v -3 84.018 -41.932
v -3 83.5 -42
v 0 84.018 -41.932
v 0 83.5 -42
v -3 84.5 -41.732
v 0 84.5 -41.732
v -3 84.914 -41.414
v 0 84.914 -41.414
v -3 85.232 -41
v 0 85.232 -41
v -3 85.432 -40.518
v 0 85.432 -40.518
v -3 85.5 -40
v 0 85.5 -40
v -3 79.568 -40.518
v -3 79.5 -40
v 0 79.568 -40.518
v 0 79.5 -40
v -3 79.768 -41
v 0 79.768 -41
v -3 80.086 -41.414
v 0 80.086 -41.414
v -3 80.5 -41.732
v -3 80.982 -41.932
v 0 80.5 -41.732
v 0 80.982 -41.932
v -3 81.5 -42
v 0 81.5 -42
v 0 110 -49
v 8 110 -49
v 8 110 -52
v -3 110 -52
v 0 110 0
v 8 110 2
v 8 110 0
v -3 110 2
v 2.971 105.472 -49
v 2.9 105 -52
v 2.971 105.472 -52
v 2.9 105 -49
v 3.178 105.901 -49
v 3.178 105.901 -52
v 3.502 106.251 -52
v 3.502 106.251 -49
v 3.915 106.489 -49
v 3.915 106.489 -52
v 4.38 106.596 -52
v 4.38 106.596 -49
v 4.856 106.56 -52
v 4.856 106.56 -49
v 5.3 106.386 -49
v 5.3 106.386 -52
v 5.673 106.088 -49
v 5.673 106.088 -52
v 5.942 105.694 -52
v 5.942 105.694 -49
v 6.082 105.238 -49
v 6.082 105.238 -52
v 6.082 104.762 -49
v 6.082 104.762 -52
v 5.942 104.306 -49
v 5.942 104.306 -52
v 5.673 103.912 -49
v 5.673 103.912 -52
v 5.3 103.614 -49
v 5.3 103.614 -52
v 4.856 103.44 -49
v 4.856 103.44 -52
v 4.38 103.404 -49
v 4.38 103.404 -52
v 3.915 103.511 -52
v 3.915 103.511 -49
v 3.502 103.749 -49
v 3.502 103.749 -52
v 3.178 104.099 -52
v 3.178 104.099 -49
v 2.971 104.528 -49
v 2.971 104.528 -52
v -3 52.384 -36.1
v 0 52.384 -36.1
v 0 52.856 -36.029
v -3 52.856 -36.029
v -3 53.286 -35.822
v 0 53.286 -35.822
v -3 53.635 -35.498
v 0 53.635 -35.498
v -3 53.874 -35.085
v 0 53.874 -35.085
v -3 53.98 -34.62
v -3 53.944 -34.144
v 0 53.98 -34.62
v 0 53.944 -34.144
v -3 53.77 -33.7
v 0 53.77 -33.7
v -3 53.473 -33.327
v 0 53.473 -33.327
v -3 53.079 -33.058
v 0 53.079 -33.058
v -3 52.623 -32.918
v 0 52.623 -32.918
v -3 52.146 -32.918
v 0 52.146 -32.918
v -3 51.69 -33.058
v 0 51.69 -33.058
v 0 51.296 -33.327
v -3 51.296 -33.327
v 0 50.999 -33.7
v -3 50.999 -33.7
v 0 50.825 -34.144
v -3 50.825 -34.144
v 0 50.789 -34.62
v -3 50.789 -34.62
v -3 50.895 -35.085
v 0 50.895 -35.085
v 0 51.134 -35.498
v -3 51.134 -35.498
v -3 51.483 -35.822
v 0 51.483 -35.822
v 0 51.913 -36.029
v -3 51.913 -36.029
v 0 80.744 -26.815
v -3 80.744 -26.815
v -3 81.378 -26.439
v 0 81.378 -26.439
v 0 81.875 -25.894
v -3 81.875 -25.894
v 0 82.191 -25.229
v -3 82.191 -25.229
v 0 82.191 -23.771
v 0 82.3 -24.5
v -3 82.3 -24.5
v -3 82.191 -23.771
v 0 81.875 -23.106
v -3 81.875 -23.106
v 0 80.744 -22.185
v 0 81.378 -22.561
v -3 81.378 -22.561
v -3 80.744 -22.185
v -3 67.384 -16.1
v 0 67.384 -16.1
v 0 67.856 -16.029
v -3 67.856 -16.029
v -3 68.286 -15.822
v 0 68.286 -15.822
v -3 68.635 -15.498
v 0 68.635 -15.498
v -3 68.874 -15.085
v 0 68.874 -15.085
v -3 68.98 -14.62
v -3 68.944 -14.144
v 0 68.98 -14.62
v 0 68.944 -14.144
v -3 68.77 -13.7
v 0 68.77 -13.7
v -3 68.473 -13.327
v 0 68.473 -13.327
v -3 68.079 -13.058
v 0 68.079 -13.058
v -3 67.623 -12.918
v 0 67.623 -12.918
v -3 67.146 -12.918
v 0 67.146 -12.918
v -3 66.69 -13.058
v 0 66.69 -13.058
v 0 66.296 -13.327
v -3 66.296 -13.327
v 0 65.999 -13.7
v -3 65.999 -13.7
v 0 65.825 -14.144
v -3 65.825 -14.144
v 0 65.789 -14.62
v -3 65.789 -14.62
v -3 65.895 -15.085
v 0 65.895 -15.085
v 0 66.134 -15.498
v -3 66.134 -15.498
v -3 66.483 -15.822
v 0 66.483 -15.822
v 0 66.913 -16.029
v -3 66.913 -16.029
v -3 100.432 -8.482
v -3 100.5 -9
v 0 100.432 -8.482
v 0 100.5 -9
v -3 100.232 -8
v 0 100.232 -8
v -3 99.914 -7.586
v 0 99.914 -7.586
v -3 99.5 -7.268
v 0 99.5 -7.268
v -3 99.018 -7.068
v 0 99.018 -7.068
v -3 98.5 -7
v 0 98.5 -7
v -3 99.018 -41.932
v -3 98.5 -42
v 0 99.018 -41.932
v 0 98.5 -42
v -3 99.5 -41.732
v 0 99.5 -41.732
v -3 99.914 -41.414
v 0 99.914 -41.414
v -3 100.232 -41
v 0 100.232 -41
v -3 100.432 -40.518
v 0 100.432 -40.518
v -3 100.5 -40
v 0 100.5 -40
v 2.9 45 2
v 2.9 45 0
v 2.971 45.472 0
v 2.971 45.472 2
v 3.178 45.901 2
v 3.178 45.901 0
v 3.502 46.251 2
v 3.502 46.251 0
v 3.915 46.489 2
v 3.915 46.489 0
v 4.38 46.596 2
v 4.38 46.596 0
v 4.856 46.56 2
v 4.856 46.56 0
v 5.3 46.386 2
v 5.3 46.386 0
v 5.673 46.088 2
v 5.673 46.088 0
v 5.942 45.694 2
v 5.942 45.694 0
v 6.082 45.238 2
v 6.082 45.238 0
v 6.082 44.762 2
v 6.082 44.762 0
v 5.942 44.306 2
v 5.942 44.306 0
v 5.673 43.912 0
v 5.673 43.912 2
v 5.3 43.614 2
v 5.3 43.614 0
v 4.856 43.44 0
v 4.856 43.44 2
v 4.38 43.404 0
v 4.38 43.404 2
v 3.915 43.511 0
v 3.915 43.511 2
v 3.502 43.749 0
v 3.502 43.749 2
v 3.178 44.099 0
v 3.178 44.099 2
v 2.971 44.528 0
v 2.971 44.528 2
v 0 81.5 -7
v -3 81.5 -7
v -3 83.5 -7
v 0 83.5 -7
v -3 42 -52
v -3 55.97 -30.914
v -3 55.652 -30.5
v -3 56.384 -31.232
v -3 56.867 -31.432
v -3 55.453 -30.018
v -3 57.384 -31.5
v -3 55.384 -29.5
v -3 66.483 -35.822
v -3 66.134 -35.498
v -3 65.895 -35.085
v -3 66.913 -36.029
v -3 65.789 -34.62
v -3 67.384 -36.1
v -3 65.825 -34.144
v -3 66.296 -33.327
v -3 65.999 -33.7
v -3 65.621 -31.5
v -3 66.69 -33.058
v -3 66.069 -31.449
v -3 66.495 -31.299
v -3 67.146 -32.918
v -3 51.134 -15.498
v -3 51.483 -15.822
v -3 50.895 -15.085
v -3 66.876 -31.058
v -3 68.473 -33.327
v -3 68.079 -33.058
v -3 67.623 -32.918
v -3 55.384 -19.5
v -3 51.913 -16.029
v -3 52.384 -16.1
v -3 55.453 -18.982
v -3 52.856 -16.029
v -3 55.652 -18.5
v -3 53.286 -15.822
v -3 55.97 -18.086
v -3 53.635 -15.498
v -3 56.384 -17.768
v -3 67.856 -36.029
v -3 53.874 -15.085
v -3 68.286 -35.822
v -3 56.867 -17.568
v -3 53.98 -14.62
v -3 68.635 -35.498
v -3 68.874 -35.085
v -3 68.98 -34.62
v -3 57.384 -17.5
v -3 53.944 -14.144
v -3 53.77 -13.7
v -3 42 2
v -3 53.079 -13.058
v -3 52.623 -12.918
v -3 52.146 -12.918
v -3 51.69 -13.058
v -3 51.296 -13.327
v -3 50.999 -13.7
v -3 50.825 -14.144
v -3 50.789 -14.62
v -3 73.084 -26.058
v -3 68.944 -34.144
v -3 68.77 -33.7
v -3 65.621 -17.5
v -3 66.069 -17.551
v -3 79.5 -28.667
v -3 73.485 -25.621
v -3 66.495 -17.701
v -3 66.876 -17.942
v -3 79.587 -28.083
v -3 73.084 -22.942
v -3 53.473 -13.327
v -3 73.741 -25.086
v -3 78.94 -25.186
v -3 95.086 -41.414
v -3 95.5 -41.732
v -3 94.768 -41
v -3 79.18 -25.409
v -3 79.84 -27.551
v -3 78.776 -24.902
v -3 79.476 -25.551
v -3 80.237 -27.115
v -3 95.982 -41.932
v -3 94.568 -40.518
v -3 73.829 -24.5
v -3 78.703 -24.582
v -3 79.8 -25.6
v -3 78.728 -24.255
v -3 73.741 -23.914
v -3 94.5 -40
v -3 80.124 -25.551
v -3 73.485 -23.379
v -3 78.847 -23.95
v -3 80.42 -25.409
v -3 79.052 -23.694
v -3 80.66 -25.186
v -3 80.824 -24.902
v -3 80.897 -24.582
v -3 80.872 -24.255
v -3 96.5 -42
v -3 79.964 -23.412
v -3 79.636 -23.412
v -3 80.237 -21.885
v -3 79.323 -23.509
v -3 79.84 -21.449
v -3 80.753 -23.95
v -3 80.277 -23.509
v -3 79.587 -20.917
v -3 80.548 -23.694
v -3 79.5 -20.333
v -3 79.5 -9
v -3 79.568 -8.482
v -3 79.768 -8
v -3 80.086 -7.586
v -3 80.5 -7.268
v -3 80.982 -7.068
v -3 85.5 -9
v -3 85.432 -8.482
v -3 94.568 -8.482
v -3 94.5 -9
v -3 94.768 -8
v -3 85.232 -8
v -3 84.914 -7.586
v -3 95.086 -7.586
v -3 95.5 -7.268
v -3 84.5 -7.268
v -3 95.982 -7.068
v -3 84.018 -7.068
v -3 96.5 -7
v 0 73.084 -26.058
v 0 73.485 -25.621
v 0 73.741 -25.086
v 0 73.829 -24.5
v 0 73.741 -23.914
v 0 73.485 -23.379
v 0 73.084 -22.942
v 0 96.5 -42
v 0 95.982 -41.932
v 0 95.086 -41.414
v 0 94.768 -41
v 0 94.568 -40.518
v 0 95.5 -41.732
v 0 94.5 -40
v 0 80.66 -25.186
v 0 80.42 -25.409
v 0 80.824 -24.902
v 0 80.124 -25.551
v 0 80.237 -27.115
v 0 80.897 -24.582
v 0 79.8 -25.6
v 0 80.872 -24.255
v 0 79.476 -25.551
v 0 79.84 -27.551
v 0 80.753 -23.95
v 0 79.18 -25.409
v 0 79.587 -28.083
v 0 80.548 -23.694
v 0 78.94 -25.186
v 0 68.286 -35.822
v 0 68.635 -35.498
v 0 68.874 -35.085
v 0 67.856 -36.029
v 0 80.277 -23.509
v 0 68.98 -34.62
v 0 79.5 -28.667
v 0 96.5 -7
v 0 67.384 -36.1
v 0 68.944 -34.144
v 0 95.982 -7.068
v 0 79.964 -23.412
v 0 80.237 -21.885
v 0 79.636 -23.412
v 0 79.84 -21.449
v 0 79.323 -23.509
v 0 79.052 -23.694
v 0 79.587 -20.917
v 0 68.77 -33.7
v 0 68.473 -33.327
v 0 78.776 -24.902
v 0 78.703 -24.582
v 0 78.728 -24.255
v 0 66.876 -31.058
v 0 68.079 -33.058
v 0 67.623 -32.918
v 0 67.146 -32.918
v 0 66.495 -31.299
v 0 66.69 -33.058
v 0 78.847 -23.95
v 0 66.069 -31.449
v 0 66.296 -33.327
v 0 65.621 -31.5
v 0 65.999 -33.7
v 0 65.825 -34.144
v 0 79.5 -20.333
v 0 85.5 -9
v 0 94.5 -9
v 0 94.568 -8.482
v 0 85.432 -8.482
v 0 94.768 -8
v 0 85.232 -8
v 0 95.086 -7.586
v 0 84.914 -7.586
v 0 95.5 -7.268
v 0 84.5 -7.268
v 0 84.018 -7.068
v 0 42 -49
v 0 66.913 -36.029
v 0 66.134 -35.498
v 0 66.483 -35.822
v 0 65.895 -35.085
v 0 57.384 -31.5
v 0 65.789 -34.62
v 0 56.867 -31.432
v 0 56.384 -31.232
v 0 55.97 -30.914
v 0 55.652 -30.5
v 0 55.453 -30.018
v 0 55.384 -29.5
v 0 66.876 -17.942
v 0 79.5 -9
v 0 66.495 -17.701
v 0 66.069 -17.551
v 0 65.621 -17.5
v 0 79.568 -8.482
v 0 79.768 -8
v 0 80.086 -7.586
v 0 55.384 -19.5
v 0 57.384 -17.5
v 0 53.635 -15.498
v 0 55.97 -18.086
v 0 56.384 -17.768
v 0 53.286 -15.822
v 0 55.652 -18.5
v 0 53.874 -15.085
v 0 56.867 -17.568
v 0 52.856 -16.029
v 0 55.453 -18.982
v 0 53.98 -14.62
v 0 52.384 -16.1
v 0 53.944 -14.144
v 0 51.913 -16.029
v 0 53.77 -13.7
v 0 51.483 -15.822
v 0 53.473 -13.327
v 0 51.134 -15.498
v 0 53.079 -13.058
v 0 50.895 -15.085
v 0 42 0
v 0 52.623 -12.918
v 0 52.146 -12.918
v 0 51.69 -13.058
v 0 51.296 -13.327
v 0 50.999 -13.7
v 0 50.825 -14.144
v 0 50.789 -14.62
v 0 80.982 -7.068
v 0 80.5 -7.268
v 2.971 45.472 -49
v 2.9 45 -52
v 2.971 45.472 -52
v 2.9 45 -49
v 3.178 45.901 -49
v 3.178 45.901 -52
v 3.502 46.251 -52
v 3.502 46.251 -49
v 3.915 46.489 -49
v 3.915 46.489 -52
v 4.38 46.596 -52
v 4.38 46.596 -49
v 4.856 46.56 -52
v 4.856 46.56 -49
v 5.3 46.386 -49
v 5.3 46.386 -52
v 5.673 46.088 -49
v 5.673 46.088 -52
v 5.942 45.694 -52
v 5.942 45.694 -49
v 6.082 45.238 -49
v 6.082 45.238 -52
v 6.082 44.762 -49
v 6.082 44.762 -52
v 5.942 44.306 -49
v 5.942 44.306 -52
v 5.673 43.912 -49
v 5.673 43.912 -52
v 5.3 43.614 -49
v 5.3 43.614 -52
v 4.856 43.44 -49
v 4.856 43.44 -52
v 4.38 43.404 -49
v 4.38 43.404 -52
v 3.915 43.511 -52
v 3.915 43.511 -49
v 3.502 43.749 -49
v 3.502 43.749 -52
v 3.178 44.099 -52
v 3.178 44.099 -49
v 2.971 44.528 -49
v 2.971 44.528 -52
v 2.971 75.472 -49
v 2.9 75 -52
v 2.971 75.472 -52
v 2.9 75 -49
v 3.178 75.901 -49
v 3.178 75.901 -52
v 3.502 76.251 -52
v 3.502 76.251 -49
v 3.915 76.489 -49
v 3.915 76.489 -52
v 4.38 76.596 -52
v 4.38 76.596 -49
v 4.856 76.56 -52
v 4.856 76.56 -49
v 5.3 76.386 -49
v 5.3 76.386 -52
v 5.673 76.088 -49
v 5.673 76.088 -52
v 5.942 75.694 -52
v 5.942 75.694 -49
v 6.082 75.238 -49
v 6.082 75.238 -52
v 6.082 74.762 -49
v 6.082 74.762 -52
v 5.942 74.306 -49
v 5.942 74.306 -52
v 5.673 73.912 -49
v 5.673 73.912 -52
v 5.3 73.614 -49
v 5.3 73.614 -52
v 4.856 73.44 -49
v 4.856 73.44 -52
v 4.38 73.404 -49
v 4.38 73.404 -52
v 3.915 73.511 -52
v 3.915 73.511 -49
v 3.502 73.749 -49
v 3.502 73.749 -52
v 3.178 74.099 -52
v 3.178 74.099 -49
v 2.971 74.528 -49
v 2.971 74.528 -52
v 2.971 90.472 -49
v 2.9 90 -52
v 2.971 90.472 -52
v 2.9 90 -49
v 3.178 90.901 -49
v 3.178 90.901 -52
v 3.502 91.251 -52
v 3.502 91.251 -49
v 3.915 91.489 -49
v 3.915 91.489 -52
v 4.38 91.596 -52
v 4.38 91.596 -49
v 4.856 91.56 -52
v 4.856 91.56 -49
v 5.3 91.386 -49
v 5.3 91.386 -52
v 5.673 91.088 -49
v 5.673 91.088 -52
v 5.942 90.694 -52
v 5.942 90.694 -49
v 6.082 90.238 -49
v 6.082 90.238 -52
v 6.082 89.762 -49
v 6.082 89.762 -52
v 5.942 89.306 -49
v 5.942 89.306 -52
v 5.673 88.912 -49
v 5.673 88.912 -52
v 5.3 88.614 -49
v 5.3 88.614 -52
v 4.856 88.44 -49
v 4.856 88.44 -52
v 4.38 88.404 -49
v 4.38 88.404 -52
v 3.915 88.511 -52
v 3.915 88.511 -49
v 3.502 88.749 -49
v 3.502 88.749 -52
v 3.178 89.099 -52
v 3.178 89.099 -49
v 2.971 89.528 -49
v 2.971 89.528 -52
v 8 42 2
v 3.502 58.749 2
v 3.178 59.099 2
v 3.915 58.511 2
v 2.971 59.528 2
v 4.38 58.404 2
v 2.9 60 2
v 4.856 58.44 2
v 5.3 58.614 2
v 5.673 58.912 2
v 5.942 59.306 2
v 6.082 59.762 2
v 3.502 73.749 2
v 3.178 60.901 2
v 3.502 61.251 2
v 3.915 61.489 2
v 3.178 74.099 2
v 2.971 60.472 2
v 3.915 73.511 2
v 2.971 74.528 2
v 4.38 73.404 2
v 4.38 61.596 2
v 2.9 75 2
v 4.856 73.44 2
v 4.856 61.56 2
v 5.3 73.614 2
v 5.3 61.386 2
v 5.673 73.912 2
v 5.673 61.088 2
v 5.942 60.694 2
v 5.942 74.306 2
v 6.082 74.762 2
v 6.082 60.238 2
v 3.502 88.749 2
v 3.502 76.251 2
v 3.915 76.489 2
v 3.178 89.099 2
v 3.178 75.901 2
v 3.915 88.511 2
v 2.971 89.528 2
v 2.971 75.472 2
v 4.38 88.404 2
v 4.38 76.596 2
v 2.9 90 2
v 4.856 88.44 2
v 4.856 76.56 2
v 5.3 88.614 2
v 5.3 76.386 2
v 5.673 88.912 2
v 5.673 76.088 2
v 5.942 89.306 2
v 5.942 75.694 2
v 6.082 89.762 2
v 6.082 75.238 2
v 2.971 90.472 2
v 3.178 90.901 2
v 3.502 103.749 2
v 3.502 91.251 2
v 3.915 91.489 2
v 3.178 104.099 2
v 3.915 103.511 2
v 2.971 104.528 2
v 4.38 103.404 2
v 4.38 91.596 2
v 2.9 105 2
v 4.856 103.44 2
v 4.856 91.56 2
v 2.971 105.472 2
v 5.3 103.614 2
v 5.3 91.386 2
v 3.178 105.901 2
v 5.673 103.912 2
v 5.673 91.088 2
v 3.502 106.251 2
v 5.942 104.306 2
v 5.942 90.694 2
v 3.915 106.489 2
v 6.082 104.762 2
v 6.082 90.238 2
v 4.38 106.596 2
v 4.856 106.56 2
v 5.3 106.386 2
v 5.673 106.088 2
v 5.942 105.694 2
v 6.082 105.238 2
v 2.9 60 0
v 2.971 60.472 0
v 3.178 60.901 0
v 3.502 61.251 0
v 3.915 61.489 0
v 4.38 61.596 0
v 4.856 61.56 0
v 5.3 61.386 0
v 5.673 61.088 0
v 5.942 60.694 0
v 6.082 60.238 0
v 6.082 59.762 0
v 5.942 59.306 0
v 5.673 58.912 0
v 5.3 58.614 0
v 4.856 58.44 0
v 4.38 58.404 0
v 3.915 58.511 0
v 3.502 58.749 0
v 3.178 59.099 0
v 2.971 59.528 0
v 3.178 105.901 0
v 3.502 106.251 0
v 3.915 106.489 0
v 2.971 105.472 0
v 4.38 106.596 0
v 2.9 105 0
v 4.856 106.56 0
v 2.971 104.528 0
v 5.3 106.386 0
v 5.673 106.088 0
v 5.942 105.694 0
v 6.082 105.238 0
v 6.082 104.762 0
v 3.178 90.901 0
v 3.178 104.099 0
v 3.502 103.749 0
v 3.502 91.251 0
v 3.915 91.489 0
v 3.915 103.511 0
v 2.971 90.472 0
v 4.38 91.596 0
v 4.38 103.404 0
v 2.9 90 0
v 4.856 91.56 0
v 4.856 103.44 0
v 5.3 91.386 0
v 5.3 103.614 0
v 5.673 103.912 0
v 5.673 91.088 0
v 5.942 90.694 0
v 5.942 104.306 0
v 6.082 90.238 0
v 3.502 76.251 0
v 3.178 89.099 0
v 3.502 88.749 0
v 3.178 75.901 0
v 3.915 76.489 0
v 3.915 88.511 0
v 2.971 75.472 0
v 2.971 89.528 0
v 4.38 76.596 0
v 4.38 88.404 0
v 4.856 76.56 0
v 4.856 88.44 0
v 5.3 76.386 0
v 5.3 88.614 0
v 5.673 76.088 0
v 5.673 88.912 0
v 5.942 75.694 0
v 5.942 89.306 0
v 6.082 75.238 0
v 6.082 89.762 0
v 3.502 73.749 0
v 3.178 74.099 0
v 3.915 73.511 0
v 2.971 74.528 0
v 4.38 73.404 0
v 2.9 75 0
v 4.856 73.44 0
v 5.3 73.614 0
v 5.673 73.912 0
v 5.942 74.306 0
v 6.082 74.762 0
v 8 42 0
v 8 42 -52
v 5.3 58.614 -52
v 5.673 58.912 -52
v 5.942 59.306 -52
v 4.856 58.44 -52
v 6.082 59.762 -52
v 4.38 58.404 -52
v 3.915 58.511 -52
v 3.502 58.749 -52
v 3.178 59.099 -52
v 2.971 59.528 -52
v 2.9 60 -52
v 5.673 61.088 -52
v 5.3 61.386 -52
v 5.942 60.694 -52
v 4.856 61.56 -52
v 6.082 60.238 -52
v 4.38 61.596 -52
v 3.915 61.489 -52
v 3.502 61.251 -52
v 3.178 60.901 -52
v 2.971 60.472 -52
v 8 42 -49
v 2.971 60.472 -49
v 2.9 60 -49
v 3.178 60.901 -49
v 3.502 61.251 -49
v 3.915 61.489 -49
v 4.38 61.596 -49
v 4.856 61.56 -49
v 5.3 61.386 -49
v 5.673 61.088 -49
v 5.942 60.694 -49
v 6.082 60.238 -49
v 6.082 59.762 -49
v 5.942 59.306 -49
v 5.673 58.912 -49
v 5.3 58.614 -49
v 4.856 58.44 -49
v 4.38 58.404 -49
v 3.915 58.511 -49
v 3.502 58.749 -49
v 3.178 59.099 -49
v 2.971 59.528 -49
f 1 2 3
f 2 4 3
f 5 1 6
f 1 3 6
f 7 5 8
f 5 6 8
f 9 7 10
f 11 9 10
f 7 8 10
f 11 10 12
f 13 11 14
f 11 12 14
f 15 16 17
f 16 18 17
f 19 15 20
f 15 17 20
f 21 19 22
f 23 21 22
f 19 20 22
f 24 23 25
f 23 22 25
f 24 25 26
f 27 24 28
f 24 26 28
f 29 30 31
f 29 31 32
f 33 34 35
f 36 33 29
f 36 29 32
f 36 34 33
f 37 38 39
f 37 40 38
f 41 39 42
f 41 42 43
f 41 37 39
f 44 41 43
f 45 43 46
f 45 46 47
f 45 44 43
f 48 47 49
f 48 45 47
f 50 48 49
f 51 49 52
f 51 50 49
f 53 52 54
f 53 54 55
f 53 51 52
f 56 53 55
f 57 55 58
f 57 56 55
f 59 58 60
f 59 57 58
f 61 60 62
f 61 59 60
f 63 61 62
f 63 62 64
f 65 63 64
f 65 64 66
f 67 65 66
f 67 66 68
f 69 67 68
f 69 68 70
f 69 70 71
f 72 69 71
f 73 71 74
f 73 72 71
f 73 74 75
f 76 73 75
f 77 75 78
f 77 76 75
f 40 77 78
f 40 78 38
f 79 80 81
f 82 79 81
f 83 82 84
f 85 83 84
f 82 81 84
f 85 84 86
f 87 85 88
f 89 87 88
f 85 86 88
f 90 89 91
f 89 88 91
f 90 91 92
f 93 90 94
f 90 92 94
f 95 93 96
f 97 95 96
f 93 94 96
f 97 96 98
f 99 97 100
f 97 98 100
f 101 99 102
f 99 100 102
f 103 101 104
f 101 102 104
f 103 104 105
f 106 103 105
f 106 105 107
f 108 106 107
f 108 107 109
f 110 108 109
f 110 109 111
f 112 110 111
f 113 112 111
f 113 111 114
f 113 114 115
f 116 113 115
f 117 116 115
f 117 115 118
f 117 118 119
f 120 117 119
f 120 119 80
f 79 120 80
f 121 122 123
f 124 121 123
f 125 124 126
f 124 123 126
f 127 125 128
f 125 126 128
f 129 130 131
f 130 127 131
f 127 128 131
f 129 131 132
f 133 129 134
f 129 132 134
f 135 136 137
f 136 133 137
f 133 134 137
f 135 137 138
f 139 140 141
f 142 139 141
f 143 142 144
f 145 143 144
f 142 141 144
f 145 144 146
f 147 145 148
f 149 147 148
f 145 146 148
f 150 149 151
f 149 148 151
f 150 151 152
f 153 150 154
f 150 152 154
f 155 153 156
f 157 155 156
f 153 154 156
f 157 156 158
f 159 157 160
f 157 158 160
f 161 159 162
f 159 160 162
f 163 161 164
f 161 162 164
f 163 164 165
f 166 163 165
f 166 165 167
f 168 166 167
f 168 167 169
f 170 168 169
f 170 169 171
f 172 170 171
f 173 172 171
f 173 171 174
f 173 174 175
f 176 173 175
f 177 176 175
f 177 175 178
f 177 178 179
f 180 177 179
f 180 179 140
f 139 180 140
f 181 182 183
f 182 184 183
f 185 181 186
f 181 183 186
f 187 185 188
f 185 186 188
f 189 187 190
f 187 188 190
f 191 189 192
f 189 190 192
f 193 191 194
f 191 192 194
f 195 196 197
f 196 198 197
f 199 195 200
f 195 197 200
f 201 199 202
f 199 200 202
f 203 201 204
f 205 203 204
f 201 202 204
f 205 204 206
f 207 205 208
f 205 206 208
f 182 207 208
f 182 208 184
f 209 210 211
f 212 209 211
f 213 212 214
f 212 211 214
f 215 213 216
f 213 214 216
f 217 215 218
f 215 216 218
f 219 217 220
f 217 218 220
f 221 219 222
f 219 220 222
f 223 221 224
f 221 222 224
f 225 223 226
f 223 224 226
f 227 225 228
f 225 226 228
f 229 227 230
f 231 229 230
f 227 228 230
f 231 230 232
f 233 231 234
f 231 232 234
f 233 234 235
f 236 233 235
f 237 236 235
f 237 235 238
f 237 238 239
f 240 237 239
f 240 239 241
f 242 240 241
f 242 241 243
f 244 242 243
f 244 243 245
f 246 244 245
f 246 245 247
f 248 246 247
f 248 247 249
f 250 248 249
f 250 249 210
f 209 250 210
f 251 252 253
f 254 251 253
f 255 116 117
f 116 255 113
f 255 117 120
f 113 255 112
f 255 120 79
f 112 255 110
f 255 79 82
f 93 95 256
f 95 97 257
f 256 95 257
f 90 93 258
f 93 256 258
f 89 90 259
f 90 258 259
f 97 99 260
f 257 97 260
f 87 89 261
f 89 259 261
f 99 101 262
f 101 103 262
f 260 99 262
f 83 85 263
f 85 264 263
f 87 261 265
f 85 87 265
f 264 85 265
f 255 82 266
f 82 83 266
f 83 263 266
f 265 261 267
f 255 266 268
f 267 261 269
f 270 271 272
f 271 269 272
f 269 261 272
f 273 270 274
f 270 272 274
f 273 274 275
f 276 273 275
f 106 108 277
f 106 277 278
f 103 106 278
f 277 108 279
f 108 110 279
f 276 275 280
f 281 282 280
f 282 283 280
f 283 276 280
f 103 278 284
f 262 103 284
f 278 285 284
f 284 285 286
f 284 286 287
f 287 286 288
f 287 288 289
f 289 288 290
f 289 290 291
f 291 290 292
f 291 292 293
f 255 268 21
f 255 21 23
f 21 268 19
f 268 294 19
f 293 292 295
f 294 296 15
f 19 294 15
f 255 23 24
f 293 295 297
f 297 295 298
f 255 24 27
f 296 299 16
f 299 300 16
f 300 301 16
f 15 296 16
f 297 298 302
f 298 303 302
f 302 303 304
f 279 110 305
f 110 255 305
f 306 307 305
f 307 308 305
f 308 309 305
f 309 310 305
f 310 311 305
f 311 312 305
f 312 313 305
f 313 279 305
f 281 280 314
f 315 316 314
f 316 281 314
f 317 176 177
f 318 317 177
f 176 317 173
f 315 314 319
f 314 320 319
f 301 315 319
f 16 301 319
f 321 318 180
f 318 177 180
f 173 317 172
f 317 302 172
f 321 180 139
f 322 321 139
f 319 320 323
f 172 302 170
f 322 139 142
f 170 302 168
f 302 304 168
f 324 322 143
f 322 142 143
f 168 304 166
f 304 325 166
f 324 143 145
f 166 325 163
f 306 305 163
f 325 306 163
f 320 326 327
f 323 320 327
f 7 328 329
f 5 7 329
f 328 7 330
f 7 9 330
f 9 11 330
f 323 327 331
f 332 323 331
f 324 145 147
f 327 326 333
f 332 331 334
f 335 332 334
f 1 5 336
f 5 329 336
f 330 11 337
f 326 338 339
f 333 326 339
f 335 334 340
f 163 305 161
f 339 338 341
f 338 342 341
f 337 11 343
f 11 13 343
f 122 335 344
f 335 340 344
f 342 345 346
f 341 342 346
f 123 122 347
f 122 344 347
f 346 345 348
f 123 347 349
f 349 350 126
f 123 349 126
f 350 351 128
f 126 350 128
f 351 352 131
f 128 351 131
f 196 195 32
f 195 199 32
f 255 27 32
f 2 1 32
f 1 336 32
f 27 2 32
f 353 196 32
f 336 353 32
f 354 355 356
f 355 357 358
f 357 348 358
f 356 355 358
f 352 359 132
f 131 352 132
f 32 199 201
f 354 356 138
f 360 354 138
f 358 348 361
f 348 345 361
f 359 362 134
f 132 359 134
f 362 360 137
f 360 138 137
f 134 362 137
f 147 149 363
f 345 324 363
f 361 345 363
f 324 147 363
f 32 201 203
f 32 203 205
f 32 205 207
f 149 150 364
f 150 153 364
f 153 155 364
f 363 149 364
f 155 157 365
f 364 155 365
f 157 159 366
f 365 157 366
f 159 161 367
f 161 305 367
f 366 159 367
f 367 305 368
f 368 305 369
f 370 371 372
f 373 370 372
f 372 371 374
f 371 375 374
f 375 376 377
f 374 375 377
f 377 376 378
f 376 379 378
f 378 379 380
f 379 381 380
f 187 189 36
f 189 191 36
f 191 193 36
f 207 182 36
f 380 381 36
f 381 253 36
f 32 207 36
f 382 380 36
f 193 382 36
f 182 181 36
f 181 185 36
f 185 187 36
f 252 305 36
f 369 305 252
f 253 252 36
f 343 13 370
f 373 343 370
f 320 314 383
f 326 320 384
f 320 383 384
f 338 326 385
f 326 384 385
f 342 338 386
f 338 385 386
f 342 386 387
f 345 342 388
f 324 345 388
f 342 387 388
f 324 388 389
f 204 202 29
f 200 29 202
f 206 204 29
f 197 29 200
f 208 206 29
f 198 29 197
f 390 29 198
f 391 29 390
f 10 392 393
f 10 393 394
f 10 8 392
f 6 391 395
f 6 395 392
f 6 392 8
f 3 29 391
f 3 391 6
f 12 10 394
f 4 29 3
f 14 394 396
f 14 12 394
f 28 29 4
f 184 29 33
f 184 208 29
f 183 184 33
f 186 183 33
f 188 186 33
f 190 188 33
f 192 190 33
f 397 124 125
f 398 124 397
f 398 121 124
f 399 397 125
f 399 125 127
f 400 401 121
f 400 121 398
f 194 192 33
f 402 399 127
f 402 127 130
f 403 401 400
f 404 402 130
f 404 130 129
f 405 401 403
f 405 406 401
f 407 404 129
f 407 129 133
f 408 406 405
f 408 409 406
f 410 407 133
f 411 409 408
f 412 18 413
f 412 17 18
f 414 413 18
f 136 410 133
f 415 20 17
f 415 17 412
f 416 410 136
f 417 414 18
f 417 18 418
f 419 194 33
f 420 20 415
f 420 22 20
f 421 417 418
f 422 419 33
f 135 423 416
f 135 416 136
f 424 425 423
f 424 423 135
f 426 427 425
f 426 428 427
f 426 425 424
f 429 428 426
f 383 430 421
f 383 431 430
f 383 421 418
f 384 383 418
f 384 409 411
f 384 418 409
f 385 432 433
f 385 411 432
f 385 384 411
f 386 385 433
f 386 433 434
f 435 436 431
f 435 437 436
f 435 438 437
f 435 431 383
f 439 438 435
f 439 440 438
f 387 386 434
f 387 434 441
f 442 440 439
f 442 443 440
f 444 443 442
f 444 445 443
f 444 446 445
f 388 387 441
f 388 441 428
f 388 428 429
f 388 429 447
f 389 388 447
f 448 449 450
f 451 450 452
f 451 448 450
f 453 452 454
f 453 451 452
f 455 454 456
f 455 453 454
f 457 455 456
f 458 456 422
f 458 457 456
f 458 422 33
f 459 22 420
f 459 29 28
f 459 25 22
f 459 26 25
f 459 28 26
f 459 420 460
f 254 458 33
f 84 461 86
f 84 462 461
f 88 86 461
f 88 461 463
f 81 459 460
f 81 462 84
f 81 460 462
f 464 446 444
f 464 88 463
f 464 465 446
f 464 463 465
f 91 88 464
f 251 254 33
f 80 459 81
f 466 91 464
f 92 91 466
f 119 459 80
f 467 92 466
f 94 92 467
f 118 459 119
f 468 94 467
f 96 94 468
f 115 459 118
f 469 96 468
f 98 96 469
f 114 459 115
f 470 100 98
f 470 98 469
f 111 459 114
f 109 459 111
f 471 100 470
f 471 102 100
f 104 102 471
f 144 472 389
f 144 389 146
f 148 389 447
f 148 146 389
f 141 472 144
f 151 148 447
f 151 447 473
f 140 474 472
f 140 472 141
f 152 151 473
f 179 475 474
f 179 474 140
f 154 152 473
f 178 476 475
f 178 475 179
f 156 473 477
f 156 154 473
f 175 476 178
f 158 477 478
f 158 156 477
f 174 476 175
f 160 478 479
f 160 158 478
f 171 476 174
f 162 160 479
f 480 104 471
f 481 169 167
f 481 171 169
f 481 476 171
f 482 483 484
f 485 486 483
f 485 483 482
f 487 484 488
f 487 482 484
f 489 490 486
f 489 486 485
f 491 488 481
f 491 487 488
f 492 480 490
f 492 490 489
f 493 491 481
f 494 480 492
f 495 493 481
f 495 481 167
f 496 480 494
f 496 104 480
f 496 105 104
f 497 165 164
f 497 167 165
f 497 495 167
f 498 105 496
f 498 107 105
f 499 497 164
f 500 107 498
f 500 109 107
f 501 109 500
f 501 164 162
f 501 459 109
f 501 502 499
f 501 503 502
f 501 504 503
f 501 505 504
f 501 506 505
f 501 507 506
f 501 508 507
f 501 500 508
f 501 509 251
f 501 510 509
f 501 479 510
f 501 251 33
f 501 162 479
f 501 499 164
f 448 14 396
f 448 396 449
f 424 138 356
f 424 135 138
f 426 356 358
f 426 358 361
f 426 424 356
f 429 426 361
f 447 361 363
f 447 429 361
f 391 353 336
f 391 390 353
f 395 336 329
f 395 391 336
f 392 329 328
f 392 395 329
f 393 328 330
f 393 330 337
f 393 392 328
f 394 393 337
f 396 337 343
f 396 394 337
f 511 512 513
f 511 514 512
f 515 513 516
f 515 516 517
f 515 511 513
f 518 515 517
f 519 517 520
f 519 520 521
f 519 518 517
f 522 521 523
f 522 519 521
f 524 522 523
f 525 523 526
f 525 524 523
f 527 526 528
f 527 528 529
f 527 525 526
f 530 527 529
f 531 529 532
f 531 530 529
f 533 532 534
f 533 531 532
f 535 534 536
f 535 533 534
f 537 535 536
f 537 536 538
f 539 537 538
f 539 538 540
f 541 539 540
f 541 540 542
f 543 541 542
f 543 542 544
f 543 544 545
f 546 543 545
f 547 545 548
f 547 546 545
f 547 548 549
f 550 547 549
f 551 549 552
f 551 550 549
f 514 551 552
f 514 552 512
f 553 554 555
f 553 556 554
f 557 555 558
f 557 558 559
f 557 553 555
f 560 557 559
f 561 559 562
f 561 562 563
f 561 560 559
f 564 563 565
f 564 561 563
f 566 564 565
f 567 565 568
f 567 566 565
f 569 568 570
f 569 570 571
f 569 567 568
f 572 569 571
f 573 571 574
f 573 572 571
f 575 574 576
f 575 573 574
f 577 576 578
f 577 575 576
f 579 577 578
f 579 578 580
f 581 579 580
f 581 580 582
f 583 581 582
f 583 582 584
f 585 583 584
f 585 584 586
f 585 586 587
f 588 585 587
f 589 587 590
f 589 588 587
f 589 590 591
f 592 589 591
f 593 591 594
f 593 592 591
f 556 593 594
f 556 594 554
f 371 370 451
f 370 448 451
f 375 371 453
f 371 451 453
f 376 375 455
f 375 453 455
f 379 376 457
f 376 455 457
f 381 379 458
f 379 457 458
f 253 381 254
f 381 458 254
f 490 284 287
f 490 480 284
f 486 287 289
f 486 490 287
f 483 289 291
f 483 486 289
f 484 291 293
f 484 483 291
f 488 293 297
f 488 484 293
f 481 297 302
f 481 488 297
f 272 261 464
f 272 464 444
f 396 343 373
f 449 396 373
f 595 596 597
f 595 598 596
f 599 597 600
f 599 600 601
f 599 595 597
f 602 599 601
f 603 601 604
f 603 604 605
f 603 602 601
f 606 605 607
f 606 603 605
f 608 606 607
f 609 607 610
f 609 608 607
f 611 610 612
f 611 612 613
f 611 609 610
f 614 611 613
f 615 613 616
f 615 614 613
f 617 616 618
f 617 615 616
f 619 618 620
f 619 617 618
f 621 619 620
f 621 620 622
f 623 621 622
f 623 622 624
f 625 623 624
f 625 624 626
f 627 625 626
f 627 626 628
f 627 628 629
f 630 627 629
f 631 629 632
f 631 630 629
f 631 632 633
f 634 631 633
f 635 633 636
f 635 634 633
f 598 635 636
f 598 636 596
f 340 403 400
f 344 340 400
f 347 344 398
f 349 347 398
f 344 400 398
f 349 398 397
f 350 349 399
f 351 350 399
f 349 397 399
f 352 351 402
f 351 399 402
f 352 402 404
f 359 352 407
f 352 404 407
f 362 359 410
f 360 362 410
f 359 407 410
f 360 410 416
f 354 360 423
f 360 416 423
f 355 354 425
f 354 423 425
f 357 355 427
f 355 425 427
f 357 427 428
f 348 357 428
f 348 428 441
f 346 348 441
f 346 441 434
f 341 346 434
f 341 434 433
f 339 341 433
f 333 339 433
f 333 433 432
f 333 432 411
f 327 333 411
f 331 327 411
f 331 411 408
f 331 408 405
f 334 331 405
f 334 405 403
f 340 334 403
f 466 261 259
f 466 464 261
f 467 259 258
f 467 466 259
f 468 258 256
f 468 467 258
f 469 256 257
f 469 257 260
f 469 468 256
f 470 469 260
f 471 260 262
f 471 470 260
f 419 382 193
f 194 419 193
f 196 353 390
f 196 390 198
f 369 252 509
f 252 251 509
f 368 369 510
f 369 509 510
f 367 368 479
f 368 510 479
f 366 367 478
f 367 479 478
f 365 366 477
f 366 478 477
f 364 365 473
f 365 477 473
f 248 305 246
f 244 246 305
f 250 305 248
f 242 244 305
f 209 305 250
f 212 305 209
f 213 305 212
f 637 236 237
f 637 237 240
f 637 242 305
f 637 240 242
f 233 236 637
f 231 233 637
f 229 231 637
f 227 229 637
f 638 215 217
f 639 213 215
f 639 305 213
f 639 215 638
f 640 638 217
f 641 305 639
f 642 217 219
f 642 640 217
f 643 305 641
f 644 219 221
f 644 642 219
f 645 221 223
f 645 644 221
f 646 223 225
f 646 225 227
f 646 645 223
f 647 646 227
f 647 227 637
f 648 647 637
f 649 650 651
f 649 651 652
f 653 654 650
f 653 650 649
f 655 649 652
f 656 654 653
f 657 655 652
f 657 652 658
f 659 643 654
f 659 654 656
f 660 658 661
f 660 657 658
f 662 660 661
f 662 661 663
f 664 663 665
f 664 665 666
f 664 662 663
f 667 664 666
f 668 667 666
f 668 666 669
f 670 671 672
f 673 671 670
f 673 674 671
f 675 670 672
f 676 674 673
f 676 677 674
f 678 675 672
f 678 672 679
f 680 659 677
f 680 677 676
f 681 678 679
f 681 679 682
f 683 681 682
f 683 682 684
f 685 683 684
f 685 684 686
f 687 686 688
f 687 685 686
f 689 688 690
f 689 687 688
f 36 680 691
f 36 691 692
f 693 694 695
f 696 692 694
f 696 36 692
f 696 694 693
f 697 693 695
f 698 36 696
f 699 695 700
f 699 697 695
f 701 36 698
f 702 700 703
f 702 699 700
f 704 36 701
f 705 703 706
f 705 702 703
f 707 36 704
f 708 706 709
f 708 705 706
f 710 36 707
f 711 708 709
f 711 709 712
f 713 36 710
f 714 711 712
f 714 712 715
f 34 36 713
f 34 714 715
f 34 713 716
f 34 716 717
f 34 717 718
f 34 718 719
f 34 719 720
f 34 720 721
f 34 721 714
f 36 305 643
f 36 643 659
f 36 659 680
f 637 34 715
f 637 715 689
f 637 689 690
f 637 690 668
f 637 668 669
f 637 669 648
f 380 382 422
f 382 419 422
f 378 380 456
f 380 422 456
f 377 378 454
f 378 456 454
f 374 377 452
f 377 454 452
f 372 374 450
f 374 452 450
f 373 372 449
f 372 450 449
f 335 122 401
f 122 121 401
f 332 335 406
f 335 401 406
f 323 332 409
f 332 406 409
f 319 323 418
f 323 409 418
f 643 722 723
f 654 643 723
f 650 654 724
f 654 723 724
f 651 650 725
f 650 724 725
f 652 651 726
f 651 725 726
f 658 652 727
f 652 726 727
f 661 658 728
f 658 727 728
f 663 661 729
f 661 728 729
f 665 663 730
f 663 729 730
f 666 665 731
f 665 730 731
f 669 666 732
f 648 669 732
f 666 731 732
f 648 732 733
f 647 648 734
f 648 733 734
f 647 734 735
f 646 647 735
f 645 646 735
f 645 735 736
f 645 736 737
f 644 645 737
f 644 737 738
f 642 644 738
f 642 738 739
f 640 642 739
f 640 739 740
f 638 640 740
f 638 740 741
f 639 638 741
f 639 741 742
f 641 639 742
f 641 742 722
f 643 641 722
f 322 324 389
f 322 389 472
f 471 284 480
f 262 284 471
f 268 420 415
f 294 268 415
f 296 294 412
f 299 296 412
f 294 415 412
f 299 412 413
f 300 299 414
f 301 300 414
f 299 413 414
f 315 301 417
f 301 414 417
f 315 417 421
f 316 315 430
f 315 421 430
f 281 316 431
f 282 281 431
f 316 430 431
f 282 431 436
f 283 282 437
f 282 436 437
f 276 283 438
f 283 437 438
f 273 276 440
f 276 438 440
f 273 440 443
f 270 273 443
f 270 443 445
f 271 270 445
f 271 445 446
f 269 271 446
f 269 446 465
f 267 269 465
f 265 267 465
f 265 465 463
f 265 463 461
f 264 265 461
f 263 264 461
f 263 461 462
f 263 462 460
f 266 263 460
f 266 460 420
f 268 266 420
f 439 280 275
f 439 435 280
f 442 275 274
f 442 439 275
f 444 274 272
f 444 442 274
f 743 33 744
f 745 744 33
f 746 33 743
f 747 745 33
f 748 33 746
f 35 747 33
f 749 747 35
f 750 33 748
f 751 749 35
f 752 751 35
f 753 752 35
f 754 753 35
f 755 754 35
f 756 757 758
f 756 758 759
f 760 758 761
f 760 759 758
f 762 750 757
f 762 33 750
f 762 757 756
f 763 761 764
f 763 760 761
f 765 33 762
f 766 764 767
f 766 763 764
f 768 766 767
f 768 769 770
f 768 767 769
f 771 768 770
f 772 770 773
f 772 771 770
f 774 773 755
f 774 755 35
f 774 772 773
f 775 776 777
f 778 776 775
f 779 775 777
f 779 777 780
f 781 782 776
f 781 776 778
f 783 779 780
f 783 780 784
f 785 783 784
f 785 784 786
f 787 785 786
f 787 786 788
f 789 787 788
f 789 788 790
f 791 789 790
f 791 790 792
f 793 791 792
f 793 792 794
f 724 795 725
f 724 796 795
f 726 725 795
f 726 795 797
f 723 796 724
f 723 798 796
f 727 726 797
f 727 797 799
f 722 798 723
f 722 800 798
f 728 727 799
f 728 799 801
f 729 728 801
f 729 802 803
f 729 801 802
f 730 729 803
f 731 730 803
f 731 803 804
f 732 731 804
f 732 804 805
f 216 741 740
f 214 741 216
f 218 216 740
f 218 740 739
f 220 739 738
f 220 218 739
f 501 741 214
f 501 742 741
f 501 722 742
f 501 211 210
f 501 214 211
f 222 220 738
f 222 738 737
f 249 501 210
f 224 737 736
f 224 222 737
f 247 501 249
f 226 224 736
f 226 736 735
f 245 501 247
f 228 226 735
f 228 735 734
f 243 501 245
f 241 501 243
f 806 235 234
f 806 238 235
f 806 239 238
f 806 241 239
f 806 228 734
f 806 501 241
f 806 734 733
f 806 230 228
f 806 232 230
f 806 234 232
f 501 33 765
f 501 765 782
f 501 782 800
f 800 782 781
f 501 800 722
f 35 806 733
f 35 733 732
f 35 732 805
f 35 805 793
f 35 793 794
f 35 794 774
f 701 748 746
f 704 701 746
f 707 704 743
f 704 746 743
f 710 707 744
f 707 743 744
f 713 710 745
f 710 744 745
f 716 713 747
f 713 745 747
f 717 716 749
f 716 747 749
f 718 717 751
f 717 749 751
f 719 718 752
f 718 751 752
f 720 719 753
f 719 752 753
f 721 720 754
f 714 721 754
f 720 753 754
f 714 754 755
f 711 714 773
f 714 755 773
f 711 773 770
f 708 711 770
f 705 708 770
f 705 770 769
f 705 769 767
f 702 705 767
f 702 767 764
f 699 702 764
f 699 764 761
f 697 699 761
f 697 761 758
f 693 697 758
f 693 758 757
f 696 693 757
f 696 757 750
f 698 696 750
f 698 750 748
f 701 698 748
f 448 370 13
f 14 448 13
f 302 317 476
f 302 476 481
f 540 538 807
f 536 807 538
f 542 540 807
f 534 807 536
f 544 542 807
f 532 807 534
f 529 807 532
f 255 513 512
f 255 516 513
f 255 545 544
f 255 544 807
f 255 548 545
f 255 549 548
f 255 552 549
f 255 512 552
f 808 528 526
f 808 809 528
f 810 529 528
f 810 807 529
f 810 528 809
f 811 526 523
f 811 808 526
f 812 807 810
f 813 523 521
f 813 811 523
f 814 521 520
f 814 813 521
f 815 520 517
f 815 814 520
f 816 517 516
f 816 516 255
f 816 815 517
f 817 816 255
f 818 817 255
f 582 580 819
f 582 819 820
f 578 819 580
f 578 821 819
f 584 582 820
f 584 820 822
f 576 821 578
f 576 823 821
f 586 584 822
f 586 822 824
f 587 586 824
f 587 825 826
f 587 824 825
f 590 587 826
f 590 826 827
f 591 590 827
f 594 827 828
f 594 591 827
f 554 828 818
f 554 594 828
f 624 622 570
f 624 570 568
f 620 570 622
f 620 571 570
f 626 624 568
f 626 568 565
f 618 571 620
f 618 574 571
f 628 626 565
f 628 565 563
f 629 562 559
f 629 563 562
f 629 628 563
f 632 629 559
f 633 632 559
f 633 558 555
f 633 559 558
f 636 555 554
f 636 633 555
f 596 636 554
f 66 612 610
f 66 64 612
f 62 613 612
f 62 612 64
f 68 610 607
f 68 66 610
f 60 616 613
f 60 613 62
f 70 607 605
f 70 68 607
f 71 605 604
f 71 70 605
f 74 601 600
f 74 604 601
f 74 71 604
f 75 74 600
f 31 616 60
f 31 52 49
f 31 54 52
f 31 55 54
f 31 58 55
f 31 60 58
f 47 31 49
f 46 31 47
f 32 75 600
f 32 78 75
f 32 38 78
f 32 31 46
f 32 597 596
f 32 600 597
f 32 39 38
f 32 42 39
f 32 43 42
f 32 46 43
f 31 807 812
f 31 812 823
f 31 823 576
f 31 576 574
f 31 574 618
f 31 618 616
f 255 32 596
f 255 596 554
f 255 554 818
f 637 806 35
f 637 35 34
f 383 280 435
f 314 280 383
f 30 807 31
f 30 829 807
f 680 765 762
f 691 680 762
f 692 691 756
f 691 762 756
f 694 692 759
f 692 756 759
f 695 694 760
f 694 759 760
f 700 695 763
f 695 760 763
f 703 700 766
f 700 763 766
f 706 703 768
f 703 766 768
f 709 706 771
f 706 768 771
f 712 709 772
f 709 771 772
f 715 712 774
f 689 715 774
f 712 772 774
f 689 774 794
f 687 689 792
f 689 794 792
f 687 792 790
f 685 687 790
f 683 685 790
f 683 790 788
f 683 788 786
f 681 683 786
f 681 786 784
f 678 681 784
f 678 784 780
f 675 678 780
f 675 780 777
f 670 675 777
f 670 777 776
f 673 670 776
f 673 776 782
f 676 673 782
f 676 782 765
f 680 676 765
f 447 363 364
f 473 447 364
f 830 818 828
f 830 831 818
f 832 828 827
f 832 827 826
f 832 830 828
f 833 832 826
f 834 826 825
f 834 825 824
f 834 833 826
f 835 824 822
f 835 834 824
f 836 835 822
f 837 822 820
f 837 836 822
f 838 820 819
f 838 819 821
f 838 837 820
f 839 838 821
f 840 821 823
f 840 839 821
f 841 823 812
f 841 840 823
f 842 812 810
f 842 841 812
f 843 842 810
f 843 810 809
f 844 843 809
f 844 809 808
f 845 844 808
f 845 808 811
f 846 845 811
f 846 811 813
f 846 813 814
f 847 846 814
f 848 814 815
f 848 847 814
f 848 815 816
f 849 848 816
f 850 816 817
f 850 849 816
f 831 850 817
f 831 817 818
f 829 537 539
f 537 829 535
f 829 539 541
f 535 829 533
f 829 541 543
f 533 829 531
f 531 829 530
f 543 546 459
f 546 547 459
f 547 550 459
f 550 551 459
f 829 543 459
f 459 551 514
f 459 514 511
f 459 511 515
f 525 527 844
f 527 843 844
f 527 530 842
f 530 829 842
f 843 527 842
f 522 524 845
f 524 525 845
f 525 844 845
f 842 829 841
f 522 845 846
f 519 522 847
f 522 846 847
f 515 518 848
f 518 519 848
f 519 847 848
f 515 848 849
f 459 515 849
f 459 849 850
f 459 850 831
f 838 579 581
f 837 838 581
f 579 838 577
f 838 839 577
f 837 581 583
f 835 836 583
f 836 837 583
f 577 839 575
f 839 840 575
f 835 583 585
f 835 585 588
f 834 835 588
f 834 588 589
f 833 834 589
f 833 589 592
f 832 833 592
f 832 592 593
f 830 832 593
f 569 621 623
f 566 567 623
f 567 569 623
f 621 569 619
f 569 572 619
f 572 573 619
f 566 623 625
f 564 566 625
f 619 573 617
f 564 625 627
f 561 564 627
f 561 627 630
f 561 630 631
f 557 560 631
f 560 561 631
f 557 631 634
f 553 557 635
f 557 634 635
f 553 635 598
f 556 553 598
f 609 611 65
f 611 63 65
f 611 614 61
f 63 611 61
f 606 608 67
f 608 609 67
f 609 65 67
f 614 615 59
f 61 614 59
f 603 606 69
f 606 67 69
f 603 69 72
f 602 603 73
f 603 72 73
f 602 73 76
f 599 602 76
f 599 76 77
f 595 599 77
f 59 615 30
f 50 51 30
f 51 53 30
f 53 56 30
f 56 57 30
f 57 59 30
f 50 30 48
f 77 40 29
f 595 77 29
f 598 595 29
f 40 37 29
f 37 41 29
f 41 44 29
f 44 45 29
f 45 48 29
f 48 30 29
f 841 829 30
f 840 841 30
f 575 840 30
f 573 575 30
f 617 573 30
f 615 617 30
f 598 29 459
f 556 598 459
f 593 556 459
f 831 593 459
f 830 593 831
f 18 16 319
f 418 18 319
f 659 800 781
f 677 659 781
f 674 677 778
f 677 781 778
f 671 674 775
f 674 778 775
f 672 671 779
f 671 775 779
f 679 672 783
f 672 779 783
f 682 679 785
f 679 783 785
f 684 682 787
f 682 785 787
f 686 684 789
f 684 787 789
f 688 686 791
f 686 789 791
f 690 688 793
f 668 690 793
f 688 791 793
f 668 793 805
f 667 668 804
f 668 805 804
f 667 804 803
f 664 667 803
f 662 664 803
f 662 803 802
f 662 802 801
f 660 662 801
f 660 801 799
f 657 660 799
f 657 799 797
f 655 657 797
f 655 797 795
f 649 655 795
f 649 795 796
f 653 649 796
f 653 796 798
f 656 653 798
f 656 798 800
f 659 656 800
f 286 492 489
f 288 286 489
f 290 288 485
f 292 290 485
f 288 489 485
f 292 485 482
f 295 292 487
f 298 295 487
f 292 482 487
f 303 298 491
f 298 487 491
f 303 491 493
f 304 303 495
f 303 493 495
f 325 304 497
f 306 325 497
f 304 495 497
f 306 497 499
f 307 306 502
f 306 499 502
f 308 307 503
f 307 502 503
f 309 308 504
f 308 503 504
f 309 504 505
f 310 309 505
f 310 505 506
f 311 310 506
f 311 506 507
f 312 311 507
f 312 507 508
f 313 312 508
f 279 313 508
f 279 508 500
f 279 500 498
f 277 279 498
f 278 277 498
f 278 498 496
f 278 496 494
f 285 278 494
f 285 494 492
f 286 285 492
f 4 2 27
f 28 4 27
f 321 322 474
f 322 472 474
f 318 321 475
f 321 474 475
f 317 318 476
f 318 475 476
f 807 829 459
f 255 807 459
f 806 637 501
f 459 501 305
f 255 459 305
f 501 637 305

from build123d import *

# Parameters (mm, degrees)
EXTRUDE_1_DEPTH          = 120
SKETCH_2_R               = 1.6
CUT_EXTRUDE_1_DEPTH      = 120
SKETCH_3_R               = 1.6
CUT_EXTRUDE_2_DEPTH      = 10
SKETCH_4_R               = 1.1
CUT_EXTRUDE_3_DEPTH      = 12
SKETCH_5_W               = 11
SKETCH_5_H               = 120
EXTRUDE_2_DEPTH          = 2
SKETCH_6_W               = 49
SKETCH_6_H               = 30
CUT_EXTRUDE_4_DEPTH      = 10
CUT_EXTRUDE_5_DEPTH      = 42
CUT_EXTRUDE_5_DEPTH_BACK = 16
SKETCH_7_W               = 3
SKETCH_7_H               = 30
CUT_EXTRUDE_6_DEPTH      = 35
CUT_EXTRUDE_6_DEPTH_BACK = 11
SKETCH_8_W               = 52
SKETCH_8_H               = 12
SKETCH_9_W               = 2
SKETCH_9_H               = 42
CUT_EXTRUDE_7_DEPTH      = 20
SKETCH_10_W              = 11
SKETCH_10_H              = 54
CUT_EXTRUDE_8_DEPTH      = 10
SKETCH_11_W              = 11
SKETCH_11_H              = 68
SKETCH_11_R              = 1.6
EXTRUDE_3_DEPTH          = 1
SKETCH_12_W              = 11
SKETCH_12_H              = 1
CUT_EXTRUDE_9_DEPTH      = 91
CUT_EXTRUDE_10_DEPTH     = 10
SKETCH_14_W              = 35
SKETCH_14_H              = 6
CUT_EXTRUDE_11_DEPTH     = 10
FILLET_1_R               = 2


with BuildPart() as part:
    # 草图1 → 凸台-拉伸1 (new body)
    with BuildSketch(Plane(origin=(0, 0, 0), x_dir=(1, 0, 0), z_dir=(0, 1, 0))):
        Polygon((0, 0), (8, 0), (8, -3), (-3, -3), (-3, 49), (0, 49), align=None)
    extrude(amount=EXTRUDE_1_DEPTH)

    # 草图2 → 切除-拉伸1 (cut)
    with BuildSketch(Plane(origin=(0, 0, 0), x_dir=(-1, 0, 0), z_dir=(0, 0, -1))):
        with Locations((-4.5, 60)):
            Circle(SKETCH_2_R)
        with Locations((-4.5, 45)):
            Circle(SKETCH_2_R)
        with Locations((-4.5, 30)):
            Circle(SKETCH_2_R)
        with Locations((-4.5, 15)):
            Circle(SKETCH_2_R)
        with Locations((-4.5, 75)):
            Circle(SKETCH_2_R)
        with Locations((-4.5, 90)):
            Circle(SKETCH_2_R)
        with Locations((-4.5, 105)):
            Circle(SKETCH_2_R)
    cut_extrude_1 = extrude(amount=-CUT_EXTRUDE_1_DEPTH, mode=Mode.SUBTRACT)

    # 草图3 → 切除-拉伸2 (cut)
    with BuildSketch(Plane(origin=(0, 0, 0), x_dir=(0, 0, -1), z_dir=(1, 0, 0))):
        with Locations((14.5, 7.384470662)):
            Circle(SKETCH_3_R)
        with Locations((14.5, 22.384470662)):
            Circle(SKETCH_3_R)
        with Locations((14.5, 37.384470662)):
            Circle(SKETCH_3_R)
        with Locations((14.5, 52.384470662)):
            Circle(SKETCH_3_R)
        with Locations((14.5, 67.384470662)):
            Circle(SKETCH_3_R)
        with Locations((34.5, 67.384470662)):
            Circle(SKETCH_3_R)
        with Locations((34.5, 52.384470662)):
            Circle(SKETCH_3_R)
        with Locations((34.5, 37.384470662)):
            Circle(SKETCH_3_R)
        with Locations((34.5, 22.384470662)):
            Circle(SKETCH_3_R)
        with Locations((34.5, 7.384470662)):
            Circle(SKETCH_3_R)
    extrude(amount=-CUT_EXTRUDE_2_DEPTH, mode=Mode.SUBTRACT)

    # 草图4 → 切除-拉伸3 (cut)
    with BuildSketch(Plane(origin=(0, 0, 0), x_dir=(0, 0, -1), z_dir=(1, 0, 0))):
        with Locations((15.7, 117)):
            Circle(SKETCH_4_R)
        with Locations((33.3, 117)):
            Circle(SKETCH_4_R)
        with Locations((24.5, 79.8)):
            Circle(SKETCH_4_R)
    extrude(amount=-CUT_EXTRUDE_3_DEPTH, mode=Mode.SUBTRACT)

    # 草图5 → 凸台-拉伸2 (add)
    with BuildSketch(Plane(origin=(0, 0, -49), x_dir=(-1, 0, 0), z_dir=(0, 0, -1))):
        with Locations((-2.5, 60)):
            Rectangle(SKETCH_5_W, SKETCH_5_H)
    extrude(amount=EXTRUDE_2_DEPTH)

    # 镜向3: 切除-拉伸1 across plane
    add(cut_extrude_1.mirror(Plane(origin=(0, 0, -24.5), x_dir=(1, 0, 0), z_dir=(0, 0, -1))), mode=Mode.SUBTRACT)

    # 草图6 → 切除-拉伸4 (cut)
    with BuildSketch(Plane(origin=(0, 0, 0), x_dir=(0, 0, -1), z_dir=(1, 0, 0))):
        with Locations((24.5, 15)):
            Rectangle(SKETCH_6_W, SKETCH_6_H)
    extrude(amount=-CUT_EXTRUDE_4_DEPTH, mode=Mode.SUBTRACT)

    # 草图7 → 切除-拉伸5 (cut, two sides: drawn at the far end of the back side and taken through both)
    with BuildSketch(Plane(origin=(0, 0, 0), x_dir=(0, 0, -1), z_dir=(1, 0, 0)).offset(-CUT_EXTRUDE_5_DEPTH_BACK)):
        with Locations((-1.5, 15)):
            Rectangle(SKETCH_7_W, SKETCH_7_H)
    extrude(amount=CUT_EXTRUDE_5_DEPTH + CUT_EXTRUDE_5_DEPTH_BACK, mode=Mode.SUBTRACT)

    # 草图8 → 切除-拉伸6 (cut, two sides: drawn at the far end of the back side and taken through both)
    with BuildSketch(Plane(origin=(0, 0, 0), x_dir=(0, 0, -1), z_dir=(1, 0, 0)).offset(-CUT_EXTRUDE_6_DEPTH_BACK)):
        with Locations((23, 36)):
            Rectangle(SKETCH_8_W, SKETCH_8_H)
    extrude(amount=CUT_EXTRUDE_6_DEPTH + CUT_EXTRUDE_6_DEPTH_BACK, mode=Mode.SUBTRACT)

    # 草图9 → 切除-拉伸7 (cut)
    with BuildSketch(Plane.ZY.offset(3)):
        with Locations((-50, 21)):
            Rectangle(SKETCH_9_W, SKETCH_9_H)
    extrude(amount=-CUT_EXTRUDE_7_DEPTH, mode=Mode.SUBTRACT)

    # 草图10 → 切除-拉伸8 (cut)
    with BuildSketch(Plane(origin=(0, 120, 0), x_dir=(1, 0, 0), z_dir=(0, 1, 0))):
        with Locations((2.5, 24)):
            Rectangle(SKETCH_10_W, SKETCH_10_H)
    extrude(amount=-CUT_EXTRUDE_8_DEPTH, mode=Mode.SUBTRACT)

    # 草图11 → 凸台-拉伸3 (add)
    with BuildSketch(Plane(origin=(0, 0, -51), x_dir=(-1, 0, 0), z_dir=(0, 0, -1))):
        with Locations((-2.5, 76)):
            Rectangle(SKETCH_11_W, SKETCH_11_H)
        with Locations((-4.5, 105)):
            Circle(SKETCH_11_R, mode=Mode.SUBTRACT)
        with Locations((-4.5, 45)):
            Circle(SKETCH_11_R, mode=Mode.SUBTRACT)
        with Locations((-4.5, 60)):
            Circle(SKETCH_11_R, mode=Mode.SUBTRACT)
        with Locations((-4.5, 75)):
            Circle(SKETCH_11_R, mode=Mode.SUBTRACT)
        with Locations((-4.5, 90)):
            Circle(SKETCH_11_R, mode=Mode.SUBTRACT)
    extrude(amount=EXTRUDE_3_DEPTH)

    # 草图12 → 切除-拉伸9 (cut)
    with BuildSketch(Plane(origin=(0, 110, 0), x_dir=(1, 0, 0), z_dir=(0, 1, 0))):
        with Locations((2.5, -2.5)):
            Rectangle(SKETCH_12_W, SKETCH_12_H)
    extrude(amount=-CUT_EXTRUDE_9_DEPTH, mode=Mode.SUBTRACT)

    # 草图13 → 切除-拉伸10 (cut)
    with BuildSketch(Plane.ZY.offset(3)):
        Polygon((-31.5, 66.326548237), (-24.5, 75.017418774), (-17.5, 66.326548237), (-17.5, 55.384470662), (-31.5, 55.384470662), align=None)
    extrude(amount=-CUT_EXTRUDE_10_DEPTH, mode=Mode.SUBTRACT)

    # 草图14 → 切除-拉伸11 (cut)
    with BuildSketch(Plane.ZY.offset(3)):
        with Locations((-24.5, 97.5)):
            Rectangle(SKETCH_14_W, SKETCH_14_H)
        with BuildLine():
            Line((-22.018065271, 79.5), (-7, 79.5))
            Line((-7, 79.5), (-7, 85.5))
            Line((-7, 85.5), (-42, 85.5))
            Line((-42, 85.5), (-42, 79.5))
            Line((-42, 79.5), (-26.981934729, 79.5))
            ThreePointArc((-26.981934729, 79.5), (-24.5, 82.3), (-22.018065271, 79.5))
        make_face()
    extrude(amount=-CUT_EXTRUDE_11_DEPTH, mode=Mode.SUBTRACT)

    # 圆角1
    fillet_1_edges = [part.edges().sort_by_distance(p)[0] for p in [
        (-1.5, 55.384470662, -31.5),
        (-1.5, 66.326548237, -31.5),
        (-1.5, 75.017418774, -24.5),
        (-1.5, 66.326548237, -17.5),
        (-1.5, 55.384470662, -17.5),
        (-1.5, 100.5, -7),
        (-1.5, 94.5, -7),
        (-1.5, 94.5, -42),
        (-1.5, 100.5, -42),
        (-1.5, 85.5, -7),
        (-1.5, 79.5, -7),
        (-1.5, 79.5, -22.018065271),
        (-1.5, 79.5, -26.981934729),
        (-1.5, 79.5, -42),
        (-1.5, 85.5, -42),
    ]]
    fillet(fillet_1_edges, radius=FILLET_1_R)


solid = part.part
